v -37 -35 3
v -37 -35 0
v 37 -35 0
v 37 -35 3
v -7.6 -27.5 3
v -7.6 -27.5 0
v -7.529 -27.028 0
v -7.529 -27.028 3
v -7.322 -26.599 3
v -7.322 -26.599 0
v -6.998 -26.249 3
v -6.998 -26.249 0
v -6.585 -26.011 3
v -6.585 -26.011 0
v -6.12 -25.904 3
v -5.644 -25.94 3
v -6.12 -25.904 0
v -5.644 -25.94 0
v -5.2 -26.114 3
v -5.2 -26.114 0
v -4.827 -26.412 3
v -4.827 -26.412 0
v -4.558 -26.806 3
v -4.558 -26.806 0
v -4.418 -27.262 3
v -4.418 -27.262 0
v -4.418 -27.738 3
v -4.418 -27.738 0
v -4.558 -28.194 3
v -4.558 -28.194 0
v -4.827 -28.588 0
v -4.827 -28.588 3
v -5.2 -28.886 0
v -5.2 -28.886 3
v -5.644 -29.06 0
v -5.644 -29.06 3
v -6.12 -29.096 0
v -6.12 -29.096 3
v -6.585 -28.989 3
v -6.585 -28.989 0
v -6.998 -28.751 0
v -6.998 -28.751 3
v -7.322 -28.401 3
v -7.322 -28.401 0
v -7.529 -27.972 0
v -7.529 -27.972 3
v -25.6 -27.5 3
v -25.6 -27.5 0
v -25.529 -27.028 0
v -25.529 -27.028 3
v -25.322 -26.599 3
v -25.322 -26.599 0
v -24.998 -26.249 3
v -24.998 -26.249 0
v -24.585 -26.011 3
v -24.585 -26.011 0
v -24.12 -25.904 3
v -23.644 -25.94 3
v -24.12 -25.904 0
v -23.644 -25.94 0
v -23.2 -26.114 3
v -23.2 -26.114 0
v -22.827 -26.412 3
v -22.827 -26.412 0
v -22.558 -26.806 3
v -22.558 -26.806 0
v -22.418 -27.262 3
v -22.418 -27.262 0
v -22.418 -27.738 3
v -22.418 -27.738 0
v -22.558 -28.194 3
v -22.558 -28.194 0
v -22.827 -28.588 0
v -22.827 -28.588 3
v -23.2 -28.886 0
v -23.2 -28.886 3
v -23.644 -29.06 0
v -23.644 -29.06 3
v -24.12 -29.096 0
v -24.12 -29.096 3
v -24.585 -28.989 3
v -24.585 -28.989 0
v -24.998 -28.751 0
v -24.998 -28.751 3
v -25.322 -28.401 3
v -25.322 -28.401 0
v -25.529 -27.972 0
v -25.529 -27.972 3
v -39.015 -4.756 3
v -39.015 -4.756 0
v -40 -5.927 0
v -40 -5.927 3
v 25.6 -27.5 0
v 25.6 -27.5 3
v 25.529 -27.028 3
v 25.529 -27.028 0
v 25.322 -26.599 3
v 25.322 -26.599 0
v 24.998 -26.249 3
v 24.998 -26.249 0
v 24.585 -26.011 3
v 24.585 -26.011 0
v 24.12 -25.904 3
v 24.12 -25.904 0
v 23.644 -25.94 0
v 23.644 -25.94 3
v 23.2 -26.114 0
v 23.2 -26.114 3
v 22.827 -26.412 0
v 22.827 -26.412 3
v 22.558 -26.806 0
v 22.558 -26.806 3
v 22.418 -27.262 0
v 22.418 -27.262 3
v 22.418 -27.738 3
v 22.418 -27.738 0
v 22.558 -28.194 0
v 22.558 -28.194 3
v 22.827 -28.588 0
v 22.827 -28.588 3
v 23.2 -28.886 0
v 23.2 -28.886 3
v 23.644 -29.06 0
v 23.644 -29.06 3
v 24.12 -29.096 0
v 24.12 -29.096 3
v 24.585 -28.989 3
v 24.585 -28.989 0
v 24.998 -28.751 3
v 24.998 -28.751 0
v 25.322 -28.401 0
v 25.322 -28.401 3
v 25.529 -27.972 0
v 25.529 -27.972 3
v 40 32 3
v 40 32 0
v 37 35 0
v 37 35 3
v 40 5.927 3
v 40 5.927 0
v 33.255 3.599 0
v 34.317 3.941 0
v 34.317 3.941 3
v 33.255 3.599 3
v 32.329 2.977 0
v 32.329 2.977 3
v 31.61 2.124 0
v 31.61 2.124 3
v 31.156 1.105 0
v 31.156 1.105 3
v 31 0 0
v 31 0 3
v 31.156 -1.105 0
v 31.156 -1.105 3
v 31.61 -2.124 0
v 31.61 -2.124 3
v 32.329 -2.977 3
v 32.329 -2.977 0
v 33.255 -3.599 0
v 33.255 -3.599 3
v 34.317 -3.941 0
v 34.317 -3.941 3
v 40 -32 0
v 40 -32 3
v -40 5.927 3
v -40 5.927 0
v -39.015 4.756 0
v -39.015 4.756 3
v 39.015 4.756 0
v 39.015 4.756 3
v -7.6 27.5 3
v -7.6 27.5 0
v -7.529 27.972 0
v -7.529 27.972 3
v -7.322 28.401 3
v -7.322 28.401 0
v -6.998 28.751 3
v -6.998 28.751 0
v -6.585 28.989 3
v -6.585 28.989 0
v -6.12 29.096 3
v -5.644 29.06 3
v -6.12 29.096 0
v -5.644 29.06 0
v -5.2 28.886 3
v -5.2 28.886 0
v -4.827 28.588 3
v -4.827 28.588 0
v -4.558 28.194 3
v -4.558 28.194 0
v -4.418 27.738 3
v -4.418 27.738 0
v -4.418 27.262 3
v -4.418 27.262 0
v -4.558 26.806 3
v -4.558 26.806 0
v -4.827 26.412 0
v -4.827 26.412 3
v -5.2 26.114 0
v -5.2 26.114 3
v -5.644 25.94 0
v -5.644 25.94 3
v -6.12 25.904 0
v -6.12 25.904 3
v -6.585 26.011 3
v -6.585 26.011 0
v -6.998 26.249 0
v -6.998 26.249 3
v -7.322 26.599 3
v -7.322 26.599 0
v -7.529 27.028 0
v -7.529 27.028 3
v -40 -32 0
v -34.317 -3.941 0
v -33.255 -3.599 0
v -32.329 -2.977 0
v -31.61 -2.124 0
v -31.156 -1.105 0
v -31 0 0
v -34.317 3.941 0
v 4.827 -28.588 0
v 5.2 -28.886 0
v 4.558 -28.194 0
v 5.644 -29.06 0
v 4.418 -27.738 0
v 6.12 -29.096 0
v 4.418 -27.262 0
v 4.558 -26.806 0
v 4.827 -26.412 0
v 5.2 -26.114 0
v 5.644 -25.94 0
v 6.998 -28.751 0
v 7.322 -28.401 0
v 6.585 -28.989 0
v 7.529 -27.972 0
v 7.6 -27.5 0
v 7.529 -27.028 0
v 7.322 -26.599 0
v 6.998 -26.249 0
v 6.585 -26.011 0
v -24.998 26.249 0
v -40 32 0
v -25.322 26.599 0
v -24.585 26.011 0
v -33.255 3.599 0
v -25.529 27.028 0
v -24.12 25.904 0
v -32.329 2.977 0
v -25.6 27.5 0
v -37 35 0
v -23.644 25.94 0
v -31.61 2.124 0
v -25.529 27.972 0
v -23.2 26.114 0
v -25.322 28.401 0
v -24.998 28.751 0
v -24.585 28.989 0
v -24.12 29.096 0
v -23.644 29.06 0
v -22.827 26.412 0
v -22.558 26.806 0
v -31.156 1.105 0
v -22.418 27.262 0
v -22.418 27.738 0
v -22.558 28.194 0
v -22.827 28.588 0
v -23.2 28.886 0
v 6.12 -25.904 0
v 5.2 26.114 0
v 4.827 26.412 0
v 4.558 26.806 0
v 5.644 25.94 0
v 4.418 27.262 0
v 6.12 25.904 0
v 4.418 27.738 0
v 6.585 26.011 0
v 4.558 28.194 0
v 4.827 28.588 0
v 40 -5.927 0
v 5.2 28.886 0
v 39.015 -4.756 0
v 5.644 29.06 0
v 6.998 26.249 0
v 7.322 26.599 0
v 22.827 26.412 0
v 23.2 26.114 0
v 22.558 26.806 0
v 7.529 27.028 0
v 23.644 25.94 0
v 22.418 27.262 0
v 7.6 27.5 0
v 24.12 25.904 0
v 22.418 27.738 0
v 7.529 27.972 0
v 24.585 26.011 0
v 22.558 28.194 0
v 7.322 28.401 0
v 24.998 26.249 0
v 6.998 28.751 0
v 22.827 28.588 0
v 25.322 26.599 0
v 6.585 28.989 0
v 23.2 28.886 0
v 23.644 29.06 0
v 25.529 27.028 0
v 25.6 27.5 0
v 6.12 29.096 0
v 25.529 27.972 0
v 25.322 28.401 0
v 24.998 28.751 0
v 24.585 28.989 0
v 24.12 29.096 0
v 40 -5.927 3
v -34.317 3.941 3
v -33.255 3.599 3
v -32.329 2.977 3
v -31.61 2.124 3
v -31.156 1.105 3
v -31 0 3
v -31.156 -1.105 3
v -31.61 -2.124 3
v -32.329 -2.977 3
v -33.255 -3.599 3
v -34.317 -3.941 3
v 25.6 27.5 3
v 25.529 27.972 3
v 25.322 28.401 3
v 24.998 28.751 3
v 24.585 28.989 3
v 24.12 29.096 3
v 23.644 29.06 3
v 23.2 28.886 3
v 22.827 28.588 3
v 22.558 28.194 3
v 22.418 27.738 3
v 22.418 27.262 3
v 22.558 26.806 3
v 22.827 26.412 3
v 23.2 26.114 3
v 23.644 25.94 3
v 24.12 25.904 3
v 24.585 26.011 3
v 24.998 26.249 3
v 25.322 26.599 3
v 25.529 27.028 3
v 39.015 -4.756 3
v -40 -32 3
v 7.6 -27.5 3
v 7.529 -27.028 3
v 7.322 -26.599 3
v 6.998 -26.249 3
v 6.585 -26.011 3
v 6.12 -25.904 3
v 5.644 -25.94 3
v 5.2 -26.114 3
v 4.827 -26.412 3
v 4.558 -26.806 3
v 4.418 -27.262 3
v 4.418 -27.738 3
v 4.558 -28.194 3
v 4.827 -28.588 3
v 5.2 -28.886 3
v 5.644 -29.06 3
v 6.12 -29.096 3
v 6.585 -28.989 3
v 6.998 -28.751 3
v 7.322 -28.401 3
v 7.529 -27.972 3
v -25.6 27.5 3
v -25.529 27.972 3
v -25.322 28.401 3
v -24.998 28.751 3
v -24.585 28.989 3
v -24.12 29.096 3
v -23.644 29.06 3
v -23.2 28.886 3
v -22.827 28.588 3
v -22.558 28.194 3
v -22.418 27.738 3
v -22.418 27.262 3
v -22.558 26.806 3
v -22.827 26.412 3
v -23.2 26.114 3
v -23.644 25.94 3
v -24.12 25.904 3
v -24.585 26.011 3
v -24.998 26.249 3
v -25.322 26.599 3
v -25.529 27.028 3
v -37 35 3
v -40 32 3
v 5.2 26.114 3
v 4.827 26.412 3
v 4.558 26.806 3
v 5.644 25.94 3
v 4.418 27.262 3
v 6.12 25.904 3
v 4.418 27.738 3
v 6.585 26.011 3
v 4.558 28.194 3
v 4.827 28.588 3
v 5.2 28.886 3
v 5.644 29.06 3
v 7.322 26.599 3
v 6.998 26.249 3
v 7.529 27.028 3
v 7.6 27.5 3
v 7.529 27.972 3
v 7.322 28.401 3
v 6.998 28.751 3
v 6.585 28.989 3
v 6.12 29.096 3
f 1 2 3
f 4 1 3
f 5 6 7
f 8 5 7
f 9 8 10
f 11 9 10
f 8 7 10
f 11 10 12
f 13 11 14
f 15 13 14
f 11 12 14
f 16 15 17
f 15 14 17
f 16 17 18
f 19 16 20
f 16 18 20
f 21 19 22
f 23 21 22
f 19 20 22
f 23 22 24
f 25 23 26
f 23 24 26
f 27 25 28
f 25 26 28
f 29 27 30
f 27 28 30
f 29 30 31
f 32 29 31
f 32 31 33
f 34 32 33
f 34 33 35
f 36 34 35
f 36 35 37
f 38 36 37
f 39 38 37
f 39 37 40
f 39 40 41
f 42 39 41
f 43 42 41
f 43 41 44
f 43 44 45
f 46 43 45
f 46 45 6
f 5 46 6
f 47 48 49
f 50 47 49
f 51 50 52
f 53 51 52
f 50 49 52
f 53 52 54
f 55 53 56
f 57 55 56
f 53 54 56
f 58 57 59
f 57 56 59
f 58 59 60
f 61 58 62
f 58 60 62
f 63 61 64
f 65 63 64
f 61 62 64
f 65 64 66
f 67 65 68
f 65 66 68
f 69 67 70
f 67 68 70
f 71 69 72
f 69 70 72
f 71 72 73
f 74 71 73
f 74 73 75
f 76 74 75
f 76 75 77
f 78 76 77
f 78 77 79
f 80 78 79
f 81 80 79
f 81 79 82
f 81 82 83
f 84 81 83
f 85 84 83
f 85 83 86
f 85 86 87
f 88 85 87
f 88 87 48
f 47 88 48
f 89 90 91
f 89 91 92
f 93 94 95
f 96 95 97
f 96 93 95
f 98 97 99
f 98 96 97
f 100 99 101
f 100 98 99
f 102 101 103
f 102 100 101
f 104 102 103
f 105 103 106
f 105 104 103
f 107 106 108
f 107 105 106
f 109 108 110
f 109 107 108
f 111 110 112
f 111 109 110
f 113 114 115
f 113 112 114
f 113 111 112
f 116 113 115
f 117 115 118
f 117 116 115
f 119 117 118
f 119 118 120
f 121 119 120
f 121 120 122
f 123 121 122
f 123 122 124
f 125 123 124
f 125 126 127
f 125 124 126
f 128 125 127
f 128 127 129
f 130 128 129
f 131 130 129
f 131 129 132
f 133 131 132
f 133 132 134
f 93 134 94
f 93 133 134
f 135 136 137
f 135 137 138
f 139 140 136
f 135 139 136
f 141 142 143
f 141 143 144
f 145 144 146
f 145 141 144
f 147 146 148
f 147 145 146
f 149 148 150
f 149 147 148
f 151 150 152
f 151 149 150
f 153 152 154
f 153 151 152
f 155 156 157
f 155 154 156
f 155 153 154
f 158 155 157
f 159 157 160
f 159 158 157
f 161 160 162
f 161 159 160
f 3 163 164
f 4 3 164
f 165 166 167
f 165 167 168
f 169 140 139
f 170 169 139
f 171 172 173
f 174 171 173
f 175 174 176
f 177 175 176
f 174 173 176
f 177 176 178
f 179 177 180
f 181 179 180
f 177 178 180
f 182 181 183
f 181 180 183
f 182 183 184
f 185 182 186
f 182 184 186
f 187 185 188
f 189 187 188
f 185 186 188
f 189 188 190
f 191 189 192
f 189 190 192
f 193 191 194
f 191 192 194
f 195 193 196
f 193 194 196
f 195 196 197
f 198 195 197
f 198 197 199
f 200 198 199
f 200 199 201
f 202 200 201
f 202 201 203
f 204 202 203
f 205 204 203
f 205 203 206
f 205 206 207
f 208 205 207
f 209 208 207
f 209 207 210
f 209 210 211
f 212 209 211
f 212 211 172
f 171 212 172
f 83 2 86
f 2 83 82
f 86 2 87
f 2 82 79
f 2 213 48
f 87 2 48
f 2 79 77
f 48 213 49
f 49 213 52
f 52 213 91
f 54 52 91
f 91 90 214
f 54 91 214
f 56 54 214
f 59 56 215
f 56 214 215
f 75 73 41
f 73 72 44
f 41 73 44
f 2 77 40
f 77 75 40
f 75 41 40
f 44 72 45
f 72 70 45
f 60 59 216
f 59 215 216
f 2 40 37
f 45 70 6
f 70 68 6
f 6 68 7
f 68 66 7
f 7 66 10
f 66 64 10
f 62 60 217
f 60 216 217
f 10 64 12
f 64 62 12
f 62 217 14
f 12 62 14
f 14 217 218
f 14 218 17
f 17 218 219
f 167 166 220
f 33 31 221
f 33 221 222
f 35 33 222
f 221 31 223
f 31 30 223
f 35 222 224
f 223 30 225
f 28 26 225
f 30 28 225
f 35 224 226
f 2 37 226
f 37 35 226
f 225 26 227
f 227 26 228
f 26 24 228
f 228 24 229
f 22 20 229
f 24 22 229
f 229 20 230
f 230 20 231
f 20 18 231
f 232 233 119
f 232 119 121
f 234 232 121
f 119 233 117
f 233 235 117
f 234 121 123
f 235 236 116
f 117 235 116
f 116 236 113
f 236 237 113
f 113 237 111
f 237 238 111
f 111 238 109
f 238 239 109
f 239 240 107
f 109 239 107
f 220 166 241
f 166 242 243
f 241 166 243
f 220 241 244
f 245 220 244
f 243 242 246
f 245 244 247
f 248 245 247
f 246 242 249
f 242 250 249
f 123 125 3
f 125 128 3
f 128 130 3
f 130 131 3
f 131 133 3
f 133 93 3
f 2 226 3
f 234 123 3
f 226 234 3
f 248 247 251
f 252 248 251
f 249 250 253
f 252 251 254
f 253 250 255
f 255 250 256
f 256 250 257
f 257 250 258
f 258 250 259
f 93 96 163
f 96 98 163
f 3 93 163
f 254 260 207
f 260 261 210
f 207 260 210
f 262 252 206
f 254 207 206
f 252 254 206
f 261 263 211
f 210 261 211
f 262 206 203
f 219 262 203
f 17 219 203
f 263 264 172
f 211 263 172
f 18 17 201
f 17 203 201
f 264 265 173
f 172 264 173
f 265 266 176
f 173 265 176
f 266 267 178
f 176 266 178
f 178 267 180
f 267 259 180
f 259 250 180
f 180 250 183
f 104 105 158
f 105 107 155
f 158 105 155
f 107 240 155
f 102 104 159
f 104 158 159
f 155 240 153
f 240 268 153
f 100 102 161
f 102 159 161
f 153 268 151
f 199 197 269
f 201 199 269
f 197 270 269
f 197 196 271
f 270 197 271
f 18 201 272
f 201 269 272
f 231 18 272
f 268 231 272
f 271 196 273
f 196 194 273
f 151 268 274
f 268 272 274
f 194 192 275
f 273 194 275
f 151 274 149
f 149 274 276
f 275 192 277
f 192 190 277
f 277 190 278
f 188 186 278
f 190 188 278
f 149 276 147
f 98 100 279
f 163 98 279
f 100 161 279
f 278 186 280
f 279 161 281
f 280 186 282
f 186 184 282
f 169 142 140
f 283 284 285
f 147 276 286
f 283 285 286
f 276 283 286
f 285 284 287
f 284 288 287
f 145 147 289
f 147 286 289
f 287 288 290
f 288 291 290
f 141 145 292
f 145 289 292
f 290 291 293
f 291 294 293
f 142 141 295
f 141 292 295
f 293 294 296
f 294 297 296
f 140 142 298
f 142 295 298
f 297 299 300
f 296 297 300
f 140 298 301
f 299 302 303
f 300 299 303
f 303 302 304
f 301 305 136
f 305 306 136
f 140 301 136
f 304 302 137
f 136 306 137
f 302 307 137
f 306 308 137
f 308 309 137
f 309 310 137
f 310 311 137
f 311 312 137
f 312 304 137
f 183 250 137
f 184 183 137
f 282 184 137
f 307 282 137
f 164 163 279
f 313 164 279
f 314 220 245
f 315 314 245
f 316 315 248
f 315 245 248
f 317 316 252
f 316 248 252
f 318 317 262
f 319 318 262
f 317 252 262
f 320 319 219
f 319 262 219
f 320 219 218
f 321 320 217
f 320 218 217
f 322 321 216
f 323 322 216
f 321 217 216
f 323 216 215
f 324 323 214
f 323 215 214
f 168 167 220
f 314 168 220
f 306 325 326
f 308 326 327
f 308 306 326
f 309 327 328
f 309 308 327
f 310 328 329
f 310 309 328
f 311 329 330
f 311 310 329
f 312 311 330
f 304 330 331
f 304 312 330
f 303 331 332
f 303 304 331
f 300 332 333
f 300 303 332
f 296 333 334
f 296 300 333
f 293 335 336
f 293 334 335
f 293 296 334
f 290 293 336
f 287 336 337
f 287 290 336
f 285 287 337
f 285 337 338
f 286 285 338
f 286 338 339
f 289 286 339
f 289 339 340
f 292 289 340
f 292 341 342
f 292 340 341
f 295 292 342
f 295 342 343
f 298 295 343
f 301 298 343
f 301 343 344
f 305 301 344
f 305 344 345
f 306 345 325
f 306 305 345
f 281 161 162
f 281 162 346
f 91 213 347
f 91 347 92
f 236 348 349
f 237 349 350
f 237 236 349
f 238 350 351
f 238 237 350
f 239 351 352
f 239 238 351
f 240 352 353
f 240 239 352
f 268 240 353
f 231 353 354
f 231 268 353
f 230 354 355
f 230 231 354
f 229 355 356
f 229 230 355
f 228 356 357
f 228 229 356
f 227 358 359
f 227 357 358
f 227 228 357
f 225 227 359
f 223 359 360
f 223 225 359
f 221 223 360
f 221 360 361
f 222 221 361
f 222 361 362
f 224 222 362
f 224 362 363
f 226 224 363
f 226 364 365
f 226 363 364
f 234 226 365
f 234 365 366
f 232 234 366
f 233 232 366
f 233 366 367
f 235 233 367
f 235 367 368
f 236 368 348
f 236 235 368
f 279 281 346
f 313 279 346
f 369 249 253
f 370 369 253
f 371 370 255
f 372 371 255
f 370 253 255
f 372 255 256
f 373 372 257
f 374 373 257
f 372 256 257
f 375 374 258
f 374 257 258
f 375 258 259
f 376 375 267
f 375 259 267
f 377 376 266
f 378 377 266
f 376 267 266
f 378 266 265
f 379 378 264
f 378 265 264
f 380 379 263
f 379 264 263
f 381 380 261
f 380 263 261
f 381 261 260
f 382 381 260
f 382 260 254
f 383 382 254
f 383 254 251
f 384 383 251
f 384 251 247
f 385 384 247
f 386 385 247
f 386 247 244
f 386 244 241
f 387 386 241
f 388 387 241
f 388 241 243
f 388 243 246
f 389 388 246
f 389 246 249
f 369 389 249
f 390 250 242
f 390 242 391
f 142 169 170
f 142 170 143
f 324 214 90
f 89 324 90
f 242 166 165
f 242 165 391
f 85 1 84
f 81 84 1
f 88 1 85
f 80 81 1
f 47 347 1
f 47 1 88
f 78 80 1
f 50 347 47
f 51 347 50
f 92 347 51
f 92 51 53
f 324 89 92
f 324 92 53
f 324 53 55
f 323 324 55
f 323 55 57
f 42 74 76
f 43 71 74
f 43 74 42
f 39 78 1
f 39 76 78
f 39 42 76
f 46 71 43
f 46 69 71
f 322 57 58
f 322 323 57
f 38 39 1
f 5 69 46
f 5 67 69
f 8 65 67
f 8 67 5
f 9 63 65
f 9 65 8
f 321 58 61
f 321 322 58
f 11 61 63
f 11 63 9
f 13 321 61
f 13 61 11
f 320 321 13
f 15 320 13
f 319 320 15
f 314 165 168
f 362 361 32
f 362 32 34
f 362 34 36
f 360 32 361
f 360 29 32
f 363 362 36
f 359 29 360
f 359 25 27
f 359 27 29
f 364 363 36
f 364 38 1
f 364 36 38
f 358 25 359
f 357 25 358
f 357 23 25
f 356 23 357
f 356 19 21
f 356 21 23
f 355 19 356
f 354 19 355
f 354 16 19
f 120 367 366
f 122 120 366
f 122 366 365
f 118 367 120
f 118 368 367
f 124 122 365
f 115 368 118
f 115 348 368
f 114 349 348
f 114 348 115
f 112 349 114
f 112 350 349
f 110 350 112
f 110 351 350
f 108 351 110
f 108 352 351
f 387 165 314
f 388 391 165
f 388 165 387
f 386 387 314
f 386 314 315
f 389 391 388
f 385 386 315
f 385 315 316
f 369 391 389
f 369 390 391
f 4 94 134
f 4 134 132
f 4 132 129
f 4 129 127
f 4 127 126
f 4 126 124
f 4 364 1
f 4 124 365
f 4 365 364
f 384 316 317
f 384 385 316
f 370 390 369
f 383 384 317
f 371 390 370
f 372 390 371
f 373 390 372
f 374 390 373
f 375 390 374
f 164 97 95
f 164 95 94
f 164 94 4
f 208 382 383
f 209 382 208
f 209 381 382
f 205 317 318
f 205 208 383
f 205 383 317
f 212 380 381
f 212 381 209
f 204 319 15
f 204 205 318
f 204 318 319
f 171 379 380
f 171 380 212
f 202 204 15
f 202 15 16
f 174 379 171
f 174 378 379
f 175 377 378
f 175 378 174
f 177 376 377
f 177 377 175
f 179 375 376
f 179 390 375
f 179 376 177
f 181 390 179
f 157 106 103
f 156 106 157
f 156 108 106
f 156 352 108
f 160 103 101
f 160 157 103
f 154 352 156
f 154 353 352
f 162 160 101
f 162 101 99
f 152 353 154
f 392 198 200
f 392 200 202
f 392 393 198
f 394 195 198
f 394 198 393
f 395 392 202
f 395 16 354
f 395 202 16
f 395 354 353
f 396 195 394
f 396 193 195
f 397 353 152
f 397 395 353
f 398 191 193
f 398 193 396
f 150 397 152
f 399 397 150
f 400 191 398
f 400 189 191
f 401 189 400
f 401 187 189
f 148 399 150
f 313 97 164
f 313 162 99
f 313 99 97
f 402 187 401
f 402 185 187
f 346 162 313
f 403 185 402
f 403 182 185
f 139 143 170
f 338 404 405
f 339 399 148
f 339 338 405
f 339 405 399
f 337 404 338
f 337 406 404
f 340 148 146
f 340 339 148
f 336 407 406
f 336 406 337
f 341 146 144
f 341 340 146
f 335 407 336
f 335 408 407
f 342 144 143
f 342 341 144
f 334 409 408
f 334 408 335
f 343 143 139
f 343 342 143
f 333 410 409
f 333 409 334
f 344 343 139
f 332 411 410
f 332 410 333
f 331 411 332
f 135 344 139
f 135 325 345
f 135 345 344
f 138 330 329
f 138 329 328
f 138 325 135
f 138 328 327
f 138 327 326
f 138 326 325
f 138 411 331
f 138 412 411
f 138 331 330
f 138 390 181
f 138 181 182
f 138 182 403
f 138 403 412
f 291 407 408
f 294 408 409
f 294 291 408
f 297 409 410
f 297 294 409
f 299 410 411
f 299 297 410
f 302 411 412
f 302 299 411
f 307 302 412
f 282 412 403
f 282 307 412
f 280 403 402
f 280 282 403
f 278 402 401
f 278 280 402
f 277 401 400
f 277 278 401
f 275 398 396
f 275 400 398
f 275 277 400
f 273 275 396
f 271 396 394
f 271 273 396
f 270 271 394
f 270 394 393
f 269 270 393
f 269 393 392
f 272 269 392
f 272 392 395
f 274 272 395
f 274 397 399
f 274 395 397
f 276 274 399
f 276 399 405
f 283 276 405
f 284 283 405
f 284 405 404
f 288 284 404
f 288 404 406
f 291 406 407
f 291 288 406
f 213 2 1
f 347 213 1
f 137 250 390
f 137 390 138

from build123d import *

# Parameters (mm, degrees)
SKETCH241_W     = 80
SKETCH241_H     = 70
PAD125_DEPTH    = 3
SKETCH242_R     = 1.6
POCKET081_DEPTH = 5
CHAMFER085_SIZE = 3
CHAMFER086_SIZE = 1


with BuildPart() as part:
    # Sketch241 → Pad125 (new body)
    with BuildSketch(Plane.XY):
        Rectangle(SKETCH241_W, SKETCH241_H)
    extrude(amount=PAD125_DEPTH)

    # Sketch242 → Pocket081 (cut)
    with BuildSketch(Plane.XY):
        with Locations((24, 27.5)):
            Circle(SKETCH242_R)
        with Locations((6, 27.5)):
            Circle(SKETCH242_R)
        with Locations((6, -27.5)):
            Circle(SKETCH242_R)
        with Locations((24, -27.5)):
            Circle(SKETCH242_R)
        with BuildLine():
            ThreePointArc((34.316718, 3.941209), (31, 0), (34.316718, -3.941209))
            Line((34.316718, -3.941209), (40, -4.926511))
            ThreePointArc((40, -4.926511), (45.854102, 0), (40, 4.926511))
            Line((40, 4.926511), (34.316718, 3.941209))
        make_face()
    pocket081 = extrude(amount=POCKET081_DEPTH, mode=Mode.SUBTRACT)

    # Mirrored016: Pocket081 across YZ
    add(pocket081.mirror(Plane.YZ), mode=Mode.SUBTRACT)

    # Chamfer085
    chamfer085_edges = [part.edges().sort_by_distance(p)[0] for p in [
        (-40, -35, 1.5),
        (40, -35, 1.5),
        (-40, 35, 1.5),
        (40, 35, 1.5),
    ]]
    chamfer(chamfer085_edges, length=CHAMFER085_SIZE)

    # Chamfer086
    chamfer086_edges = [part.edges().sort_by_distance(p)[0] for p in [
        (40, -4.926511, 1.5),
        (40, 4.926511, 1.5),
        (-40, 4.926511, 1.5),
        (-40, -4.926511, 1.5),
    ]]
    chamfer(chamfer086_edges, length=CHAMFER086_SIZE)


solid = part.part
